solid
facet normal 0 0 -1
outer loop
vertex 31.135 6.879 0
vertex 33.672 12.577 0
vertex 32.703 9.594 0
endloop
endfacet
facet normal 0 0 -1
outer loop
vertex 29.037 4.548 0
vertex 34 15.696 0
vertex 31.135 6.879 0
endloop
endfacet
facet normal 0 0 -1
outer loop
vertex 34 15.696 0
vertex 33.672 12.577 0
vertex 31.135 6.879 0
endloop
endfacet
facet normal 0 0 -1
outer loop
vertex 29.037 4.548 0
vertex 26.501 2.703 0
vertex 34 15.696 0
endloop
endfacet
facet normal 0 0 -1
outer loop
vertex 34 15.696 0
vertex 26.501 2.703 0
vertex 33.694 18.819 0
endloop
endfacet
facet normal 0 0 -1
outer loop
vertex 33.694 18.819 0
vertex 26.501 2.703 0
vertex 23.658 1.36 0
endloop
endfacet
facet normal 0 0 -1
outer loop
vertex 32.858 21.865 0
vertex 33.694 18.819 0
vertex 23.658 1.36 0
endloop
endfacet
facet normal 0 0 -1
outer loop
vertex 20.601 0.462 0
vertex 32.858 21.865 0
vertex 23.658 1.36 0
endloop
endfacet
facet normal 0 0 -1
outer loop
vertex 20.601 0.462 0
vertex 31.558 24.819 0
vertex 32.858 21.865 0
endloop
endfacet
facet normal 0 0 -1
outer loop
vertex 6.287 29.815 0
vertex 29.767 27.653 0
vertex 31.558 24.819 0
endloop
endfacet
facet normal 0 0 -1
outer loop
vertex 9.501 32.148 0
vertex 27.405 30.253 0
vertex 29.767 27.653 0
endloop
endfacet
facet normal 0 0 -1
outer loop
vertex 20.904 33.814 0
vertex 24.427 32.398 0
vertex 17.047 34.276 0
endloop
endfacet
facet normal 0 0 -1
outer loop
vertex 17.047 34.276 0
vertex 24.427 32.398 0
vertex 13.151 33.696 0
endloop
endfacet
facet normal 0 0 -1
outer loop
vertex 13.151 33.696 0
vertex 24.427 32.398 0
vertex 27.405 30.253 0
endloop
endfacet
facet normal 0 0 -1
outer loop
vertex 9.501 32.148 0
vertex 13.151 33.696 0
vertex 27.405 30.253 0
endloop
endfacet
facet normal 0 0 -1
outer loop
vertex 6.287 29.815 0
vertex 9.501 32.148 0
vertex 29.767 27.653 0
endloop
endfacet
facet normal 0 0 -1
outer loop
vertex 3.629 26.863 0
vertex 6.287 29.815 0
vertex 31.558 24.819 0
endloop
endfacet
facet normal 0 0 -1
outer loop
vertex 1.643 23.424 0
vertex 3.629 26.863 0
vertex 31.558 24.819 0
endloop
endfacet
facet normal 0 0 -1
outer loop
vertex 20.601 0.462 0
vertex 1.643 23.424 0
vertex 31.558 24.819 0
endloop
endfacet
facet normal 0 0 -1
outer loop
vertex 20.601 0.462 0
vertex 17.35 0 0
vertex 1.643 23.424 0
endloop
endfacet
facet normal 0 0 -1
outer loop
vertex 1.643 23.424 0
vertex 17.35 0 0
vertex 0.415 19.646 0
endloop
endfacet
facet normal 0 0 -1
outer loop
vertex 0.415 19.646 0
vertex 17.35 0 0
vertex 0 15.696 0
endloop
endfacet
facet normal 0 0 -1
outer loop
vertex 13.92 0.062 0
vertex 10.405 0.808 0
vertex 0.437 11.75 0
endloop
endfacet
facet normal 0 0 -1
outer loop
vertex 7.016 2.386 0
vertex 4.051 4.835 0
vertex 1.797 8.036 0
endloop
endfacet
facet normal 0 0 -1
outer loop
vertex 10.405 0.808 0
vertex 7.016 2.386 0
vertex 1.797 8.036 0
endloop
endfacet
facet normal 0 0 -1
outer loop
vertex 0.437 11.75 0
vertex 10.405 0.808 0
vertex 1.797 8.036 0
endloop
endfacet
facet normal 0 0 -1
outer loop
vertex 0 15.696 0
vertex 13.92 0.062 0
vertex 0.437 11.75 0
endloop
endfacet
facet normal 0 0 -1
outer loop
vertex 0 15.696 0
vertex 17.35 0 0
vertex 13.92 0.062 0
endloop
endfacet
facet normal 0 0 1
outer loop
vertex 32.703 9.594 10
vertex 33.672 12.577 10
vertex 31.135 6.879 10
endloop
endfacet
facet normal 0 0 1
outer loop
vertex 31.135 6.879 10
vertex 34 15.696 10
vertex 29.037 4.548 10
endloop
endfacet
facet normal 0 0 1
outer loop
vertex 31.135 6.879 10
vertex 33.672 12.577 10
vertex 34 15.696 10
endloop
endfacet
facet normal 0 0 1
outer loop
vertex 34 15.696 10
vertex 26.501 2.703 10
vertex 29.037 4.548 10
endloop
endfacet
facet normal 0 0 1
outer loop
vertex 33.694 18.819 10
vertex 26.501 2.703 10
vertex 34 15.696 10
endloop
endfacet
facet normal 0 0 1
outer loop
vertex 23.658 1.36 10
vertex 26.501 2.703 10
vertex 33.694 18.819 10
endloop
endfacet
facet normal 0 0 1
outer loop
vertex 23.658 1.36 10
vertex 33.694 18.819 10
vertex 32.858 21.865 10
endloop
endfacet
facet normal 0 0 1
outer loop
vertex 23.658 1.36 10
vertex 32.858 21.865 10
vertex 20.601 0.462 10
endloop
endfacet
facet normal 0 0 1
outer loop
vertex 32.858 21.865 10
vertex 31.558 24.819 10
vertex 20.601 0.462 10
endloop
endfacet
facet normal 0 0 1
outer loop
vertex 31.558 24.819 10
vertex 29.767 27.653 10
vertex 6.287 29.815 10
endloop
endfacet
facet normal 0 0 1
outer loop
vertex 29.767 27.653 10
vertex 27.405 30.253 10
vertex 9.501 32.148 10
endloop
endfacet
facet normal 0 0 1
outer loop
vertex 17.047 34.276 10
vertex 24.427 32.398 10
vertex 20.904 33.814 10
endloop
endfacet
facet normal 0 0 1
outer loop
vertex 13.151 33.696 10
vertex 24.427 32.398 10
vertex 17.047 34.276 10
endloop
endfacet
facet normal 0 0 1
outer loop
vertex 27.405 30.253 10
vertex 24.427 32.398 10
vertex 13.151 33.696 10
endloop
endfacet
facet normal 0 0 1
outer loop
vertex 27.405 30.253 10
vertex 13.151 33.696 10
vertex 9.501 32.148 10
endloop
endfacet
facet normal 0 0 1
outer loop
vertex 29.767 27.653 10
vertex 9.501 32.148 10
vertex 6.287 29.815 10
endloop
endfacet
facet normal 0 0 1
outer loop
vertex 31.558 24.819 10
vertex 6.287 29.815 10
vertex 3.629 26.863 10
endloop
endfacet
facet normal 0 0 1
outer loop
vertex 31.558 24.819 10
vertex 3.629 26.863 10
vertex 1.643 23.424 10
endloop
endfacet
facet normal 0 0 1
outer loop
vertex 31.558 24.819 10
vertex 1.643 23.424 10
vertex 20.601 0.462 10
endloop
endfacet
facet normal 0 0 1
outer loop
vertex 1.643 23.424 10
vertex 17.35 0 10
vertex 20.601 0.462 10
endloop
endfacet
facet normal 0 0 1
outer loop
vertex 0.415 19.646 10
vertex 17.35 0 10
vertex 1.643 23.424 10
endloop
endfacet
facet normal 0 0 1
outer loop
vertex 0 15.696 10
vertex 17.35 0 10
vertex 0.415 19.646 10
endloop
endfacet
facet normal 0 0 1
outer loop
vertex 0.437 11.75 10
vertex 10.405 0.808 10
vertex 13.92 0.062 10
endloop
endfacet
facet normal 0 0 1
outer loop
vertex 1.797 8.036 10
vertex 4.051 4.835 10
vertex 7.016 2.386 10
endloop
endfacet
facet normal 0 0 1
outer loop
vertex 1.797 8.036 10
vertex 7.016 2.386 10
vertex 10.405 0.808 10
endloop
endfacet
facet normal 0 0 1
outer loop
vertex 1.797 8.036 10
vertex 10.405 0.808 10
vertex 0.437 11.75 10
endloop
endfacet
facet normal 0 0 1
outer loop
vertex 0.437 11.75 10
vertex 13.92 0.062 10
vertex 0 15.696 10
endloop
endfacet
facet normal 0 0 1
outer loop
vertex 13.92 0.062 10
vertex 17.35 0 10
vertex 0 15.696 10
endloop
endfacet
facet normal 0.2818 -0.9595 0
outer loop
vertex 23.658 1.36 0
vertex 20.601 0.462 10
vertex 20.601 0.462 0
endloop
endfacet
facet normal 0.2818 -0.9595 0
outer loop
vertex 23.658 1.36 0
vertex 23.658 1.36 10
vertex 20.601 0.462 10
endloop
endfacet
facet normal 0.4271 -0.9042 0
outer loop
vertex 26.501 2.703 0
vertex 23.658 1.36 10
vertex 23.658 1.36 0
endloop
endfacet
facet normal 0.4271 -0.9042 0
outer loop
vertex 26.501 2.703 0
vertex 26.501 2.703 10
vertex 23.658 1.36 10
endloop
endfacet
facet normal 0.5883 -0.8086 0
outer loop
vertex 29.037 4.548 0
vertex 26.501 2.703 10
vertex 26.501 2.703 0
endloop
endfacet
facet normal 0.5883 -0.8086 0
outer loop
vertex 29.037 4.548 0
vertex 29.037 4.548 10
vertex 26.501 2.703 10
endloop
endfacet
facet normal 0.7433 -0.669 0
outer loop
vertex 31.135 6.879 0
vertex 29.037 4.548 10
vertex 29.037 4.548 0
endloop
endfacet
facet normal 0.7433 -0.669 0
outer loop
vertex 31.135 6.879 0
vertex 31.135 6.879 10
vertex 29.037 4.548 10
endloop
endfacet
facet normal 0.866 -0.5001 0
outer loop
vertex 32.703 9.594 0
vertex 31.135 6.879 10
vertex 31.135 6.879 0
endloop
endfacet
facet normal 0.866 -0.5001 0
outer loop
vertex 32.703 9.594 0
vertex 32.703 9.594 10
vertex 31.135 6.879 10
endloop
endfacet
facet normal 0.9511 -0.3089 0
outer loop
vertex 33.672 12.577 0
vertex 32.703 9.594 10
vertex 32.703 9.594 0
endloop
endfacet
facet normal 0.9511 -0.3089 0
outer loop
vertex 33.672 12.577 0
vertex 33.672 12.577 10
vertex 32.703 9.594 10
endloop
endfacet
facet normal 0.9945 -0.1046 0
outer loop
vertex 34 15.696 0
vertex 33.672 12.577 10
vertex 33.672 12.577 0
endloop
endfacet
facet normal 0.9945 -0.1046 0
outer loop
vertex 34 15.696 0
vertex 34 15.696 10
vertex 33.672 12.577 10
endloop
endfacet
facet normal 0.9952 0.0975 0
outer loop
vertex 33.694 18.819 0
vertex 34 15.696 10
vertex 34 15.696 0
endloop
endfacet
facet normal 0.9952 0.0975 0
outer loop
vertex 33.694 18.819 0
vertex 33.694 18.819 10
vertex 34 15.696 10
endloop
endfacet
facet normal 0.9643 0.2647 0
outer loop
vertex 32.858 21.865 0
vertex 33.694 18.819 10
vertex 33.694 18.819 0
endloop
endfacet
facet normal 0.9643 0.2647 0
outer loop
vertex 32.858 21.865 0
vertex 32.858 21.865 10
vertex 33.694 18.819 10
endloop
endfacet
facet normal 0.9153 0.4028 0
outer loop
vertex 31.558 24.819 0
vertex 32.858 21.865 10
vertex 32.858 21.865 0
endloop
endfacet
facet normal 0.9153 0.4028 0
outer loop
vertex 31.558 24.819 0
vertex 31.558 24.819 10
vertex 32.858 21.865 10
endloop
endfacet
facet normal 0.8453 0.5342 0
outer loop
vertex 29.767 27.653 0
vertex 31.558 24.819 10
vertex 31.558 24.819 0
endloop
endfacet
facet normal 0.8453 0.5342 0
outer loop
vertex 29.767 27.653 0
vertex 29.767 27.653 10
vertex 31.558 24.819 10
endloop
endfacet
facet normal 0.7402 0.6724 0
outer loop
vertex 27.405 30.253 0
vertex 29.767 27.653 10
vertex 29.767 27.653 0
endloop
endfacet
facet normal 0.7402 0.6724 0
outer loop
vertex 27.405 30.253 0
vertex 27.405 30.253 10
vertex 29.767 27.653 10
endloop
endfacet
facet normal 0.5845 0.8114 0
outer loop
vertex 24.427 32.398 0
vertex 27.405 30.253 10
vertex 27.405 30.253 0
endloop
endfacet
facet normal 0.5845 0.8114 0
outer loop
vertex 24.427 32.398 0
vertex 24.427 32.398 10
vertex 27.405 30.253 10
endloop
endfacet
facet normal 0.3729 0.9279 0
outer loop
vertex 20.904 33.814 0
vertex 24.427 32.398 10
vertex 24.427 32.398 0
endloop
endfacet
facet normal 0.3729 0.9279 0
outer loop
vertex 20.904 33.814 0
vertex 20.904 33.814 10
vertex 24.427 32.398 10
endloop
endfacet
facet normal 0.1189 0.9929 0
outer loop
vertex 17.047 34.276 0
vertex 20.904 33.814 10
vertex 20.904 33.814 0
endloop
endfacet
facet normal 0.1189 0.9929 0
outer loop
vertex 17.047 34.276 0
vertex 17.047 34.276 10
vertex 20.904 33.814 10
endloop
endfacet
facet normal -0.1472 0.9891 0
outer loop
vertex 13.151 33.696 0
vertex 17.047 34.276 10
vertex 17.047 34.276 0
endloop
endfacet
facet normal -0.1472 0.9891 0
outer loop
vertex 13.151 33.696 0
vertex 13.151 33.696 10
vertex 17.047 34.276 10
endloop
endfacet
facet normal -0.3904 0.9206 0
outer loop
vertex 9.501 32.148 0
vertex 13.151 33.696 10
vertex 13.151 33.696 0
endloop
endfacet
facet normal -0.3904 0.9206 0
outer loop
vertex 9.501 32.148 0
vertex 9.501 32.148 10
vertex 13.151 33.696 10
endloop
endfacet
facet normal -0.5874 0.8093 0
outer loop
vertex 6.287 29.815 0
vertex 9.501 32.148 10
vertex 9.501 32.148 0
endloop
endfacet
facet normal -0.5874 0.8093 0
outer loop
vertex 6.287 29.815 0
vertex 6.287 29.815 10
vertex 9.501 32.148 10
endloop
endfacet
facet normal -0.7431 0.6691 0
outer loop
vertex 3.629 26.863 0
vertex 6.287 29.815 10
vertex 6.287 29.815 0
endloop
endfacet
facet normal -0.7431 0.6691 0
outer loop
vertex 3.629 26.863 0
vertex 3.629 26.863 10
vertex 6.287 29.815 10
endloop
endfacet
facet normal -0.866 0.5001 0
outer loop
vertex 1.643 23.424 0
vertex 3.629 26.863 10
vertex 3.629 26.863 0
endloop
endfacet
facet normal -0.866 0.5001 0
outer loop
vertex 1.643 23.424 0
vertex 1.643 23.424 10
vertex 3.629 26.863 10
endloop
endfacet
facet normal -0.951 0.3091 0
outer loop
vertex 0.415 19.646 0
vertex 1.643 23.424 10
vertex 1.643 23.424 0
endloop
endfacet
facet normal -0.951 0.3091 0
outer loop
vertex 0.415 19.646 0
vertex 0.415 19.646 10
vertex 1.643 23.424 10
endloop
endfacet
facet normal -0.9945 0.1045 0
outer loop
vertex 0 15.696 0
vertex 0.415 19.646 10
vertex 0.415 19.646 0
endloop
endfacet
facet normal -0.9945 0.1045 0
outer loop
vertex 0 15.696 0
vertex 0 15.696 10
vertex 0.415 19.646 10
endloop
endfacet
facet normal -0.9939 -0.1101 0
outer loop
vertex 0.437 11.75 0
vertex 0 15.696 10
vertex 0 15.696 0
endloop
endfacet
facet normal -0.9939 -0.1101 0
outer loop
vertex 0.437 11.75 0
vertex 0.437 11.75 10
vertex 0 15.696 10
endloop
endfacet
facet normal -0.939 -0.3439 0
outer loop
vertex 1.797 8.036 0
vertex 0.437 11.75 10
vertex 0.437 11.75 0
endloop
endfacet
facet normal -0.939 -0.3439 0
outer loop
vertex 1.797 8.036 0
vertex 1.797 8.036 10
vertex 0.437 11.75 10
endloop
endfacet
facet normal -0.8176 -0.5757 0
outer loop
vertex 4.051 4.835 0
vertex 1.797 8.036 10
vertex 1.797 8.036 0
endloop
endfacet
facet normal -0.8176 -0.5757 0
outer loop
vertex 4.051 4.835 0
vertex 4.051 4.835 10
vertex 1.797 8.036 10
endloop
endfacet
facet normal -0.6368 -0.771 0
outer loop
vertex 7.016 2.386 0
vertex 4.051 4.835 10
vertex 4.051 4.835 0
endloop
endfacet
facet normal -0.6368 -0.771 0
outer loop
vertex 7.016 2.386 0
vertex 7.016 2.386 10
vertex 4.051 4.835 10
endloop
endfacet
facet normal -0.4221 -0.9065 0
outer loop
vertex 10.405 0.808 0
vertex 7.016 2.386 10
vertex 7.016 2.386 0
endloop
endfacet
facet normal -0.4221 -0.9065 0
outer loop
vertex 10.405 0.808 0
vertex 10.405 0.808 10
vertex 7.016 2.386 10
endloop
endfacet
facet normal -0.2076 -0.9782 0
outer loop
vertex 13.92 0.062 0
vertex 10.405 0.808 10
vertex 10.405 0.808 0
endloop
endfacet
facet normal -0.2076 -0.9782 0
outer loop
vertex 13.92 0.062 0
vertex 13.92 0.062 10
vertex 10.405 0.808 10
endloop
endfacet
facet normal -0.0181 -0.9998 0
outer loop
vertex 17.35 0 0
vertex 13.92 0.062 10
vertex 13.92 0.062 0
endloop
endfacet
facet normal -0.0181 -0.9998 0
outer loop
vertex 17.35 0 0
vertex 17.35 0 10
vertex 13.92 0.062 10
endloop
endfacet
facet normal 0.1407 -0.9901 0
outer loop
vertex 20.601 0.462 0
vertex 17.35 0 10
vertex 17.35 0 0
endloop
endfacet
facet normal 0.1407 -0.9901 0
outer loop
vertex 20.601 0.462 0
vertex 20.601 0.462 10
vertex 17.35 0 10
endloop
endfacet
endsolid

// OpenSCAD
$fn = 32;

// ----------------------------------------------------------------------
// Cam disc: base radius 15.0 mm, lift 4.0 mm, 30 profile points
// ----------------------------------------------------------------------

// --- parameters (mm) ---
profile_height = 10;      // extrusion height
profile_points = 30;      // points of the closed outline

profile = [[34, 15.696], [33.694, 18.819], [32.858, 21.865], [31.558, 24.819], [29.767, 27.653], [27.405, 30.253], [24.427, 32.398], [20.904, 33.814], [17.047, 34.276], [13.151, 33.696], [9.501, 32.148], [6.287, 29.815], [3.629, 26.863], [1.643, 23.424], [0.415, 19.646], [0, 15.696], [0.437, 11.75], [1.797, 8.036], [4.051, 4.835], [7.016, 2.386], [10.405, 0.808], [13.92, 0.062], [17.35, 0], [20.601, 0.462], [23.658, 1.36], [26.501, 2.703], [29.037, 4.548], [31.135, 6.879], [32.703, 9.594], [33.672, 12.577]];  // single closed polygon, 30 points, counter clockwise

// --- the one profile operation ---
linear_extrude(height = profile_height) polygon(points = profile);
